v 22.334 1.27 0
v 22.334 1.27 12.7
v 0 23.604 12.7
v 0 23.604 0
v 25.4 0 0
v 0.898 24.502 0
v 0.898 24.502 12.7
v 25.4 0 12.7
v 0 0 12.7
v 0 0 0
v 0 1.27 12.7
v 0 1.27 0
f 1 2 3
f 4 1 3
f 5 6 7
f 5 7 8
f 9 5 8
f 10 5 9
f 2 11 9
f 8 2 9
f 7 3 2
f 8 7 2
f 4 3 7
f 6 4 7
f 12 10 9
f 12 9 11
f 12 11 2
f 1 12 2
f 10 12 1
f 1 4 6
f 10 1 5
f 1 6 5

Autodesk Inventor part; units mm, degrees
ref_plane "YZ Plane" through (0, 0, 0) normal (1, 0, 0) x (0, 1, 0)
ref_plane "XZ Plane" through (0, 0, 0) normal (0, 1, 0) x (-1, 0, 0)
ref_plane "XY Plane" through (0, 0, 0) normal (0, 0, 1) x (1, 0, 0)
sketch "Sketch1" plane through (0, 0, 0) normal (0, 0, 1) x (1, 0, 0)
  line L0 (0, 0) -> (0, 25.4)
  line L1 (0, 25.4) -> (25.4, 0)
  line L2 (25.4, 0) -> (0, 0)
  dimension "d0" = 25.4
  dimension "d1" = 25.4
extrude "Extrusion1" add sketch "Sketch1" along normal blind 12.7
sketch "Sketch2" plane through (0, 0, 12.7) normal (0, 0, 1) x (1, 0, 0)
  line L0 (0, 25.4) -> (0, 0) projected
  line L1 (0, 0) -> (25.4, 0) projected
  line L2 (25.4, 0) -> (0, 25.4) projected
  line L3 (1.27, 1.27) -> (22.3339, 1.27)
  line L4 (22.3339, 1.27) -> (1.27, 22.3339)
  line L5 (1.27, 1.27) -> (0, 1.27)
  line L6 (1.27, 22.3339) -> (0, 23.6039)
  line L7 (0, 23.6039) -> (0.898, 24.502)
  line L8 (0, 1.27) -> (0, 23.6039)
  line L9 (0, 23.6039) -> (0, 25.4)
  line L10 (0, 25.4) -> (0.898, 24.502)
  dimension "d4" = 1.27
extrude "Extrusion2" cut sketch "Sketch2" against normal blind 25.4 contours L2 L7 L0 | L6 L4 L3 L5 L0
properties part number "Reinforcer_Front" material "Aluminum 6061"
